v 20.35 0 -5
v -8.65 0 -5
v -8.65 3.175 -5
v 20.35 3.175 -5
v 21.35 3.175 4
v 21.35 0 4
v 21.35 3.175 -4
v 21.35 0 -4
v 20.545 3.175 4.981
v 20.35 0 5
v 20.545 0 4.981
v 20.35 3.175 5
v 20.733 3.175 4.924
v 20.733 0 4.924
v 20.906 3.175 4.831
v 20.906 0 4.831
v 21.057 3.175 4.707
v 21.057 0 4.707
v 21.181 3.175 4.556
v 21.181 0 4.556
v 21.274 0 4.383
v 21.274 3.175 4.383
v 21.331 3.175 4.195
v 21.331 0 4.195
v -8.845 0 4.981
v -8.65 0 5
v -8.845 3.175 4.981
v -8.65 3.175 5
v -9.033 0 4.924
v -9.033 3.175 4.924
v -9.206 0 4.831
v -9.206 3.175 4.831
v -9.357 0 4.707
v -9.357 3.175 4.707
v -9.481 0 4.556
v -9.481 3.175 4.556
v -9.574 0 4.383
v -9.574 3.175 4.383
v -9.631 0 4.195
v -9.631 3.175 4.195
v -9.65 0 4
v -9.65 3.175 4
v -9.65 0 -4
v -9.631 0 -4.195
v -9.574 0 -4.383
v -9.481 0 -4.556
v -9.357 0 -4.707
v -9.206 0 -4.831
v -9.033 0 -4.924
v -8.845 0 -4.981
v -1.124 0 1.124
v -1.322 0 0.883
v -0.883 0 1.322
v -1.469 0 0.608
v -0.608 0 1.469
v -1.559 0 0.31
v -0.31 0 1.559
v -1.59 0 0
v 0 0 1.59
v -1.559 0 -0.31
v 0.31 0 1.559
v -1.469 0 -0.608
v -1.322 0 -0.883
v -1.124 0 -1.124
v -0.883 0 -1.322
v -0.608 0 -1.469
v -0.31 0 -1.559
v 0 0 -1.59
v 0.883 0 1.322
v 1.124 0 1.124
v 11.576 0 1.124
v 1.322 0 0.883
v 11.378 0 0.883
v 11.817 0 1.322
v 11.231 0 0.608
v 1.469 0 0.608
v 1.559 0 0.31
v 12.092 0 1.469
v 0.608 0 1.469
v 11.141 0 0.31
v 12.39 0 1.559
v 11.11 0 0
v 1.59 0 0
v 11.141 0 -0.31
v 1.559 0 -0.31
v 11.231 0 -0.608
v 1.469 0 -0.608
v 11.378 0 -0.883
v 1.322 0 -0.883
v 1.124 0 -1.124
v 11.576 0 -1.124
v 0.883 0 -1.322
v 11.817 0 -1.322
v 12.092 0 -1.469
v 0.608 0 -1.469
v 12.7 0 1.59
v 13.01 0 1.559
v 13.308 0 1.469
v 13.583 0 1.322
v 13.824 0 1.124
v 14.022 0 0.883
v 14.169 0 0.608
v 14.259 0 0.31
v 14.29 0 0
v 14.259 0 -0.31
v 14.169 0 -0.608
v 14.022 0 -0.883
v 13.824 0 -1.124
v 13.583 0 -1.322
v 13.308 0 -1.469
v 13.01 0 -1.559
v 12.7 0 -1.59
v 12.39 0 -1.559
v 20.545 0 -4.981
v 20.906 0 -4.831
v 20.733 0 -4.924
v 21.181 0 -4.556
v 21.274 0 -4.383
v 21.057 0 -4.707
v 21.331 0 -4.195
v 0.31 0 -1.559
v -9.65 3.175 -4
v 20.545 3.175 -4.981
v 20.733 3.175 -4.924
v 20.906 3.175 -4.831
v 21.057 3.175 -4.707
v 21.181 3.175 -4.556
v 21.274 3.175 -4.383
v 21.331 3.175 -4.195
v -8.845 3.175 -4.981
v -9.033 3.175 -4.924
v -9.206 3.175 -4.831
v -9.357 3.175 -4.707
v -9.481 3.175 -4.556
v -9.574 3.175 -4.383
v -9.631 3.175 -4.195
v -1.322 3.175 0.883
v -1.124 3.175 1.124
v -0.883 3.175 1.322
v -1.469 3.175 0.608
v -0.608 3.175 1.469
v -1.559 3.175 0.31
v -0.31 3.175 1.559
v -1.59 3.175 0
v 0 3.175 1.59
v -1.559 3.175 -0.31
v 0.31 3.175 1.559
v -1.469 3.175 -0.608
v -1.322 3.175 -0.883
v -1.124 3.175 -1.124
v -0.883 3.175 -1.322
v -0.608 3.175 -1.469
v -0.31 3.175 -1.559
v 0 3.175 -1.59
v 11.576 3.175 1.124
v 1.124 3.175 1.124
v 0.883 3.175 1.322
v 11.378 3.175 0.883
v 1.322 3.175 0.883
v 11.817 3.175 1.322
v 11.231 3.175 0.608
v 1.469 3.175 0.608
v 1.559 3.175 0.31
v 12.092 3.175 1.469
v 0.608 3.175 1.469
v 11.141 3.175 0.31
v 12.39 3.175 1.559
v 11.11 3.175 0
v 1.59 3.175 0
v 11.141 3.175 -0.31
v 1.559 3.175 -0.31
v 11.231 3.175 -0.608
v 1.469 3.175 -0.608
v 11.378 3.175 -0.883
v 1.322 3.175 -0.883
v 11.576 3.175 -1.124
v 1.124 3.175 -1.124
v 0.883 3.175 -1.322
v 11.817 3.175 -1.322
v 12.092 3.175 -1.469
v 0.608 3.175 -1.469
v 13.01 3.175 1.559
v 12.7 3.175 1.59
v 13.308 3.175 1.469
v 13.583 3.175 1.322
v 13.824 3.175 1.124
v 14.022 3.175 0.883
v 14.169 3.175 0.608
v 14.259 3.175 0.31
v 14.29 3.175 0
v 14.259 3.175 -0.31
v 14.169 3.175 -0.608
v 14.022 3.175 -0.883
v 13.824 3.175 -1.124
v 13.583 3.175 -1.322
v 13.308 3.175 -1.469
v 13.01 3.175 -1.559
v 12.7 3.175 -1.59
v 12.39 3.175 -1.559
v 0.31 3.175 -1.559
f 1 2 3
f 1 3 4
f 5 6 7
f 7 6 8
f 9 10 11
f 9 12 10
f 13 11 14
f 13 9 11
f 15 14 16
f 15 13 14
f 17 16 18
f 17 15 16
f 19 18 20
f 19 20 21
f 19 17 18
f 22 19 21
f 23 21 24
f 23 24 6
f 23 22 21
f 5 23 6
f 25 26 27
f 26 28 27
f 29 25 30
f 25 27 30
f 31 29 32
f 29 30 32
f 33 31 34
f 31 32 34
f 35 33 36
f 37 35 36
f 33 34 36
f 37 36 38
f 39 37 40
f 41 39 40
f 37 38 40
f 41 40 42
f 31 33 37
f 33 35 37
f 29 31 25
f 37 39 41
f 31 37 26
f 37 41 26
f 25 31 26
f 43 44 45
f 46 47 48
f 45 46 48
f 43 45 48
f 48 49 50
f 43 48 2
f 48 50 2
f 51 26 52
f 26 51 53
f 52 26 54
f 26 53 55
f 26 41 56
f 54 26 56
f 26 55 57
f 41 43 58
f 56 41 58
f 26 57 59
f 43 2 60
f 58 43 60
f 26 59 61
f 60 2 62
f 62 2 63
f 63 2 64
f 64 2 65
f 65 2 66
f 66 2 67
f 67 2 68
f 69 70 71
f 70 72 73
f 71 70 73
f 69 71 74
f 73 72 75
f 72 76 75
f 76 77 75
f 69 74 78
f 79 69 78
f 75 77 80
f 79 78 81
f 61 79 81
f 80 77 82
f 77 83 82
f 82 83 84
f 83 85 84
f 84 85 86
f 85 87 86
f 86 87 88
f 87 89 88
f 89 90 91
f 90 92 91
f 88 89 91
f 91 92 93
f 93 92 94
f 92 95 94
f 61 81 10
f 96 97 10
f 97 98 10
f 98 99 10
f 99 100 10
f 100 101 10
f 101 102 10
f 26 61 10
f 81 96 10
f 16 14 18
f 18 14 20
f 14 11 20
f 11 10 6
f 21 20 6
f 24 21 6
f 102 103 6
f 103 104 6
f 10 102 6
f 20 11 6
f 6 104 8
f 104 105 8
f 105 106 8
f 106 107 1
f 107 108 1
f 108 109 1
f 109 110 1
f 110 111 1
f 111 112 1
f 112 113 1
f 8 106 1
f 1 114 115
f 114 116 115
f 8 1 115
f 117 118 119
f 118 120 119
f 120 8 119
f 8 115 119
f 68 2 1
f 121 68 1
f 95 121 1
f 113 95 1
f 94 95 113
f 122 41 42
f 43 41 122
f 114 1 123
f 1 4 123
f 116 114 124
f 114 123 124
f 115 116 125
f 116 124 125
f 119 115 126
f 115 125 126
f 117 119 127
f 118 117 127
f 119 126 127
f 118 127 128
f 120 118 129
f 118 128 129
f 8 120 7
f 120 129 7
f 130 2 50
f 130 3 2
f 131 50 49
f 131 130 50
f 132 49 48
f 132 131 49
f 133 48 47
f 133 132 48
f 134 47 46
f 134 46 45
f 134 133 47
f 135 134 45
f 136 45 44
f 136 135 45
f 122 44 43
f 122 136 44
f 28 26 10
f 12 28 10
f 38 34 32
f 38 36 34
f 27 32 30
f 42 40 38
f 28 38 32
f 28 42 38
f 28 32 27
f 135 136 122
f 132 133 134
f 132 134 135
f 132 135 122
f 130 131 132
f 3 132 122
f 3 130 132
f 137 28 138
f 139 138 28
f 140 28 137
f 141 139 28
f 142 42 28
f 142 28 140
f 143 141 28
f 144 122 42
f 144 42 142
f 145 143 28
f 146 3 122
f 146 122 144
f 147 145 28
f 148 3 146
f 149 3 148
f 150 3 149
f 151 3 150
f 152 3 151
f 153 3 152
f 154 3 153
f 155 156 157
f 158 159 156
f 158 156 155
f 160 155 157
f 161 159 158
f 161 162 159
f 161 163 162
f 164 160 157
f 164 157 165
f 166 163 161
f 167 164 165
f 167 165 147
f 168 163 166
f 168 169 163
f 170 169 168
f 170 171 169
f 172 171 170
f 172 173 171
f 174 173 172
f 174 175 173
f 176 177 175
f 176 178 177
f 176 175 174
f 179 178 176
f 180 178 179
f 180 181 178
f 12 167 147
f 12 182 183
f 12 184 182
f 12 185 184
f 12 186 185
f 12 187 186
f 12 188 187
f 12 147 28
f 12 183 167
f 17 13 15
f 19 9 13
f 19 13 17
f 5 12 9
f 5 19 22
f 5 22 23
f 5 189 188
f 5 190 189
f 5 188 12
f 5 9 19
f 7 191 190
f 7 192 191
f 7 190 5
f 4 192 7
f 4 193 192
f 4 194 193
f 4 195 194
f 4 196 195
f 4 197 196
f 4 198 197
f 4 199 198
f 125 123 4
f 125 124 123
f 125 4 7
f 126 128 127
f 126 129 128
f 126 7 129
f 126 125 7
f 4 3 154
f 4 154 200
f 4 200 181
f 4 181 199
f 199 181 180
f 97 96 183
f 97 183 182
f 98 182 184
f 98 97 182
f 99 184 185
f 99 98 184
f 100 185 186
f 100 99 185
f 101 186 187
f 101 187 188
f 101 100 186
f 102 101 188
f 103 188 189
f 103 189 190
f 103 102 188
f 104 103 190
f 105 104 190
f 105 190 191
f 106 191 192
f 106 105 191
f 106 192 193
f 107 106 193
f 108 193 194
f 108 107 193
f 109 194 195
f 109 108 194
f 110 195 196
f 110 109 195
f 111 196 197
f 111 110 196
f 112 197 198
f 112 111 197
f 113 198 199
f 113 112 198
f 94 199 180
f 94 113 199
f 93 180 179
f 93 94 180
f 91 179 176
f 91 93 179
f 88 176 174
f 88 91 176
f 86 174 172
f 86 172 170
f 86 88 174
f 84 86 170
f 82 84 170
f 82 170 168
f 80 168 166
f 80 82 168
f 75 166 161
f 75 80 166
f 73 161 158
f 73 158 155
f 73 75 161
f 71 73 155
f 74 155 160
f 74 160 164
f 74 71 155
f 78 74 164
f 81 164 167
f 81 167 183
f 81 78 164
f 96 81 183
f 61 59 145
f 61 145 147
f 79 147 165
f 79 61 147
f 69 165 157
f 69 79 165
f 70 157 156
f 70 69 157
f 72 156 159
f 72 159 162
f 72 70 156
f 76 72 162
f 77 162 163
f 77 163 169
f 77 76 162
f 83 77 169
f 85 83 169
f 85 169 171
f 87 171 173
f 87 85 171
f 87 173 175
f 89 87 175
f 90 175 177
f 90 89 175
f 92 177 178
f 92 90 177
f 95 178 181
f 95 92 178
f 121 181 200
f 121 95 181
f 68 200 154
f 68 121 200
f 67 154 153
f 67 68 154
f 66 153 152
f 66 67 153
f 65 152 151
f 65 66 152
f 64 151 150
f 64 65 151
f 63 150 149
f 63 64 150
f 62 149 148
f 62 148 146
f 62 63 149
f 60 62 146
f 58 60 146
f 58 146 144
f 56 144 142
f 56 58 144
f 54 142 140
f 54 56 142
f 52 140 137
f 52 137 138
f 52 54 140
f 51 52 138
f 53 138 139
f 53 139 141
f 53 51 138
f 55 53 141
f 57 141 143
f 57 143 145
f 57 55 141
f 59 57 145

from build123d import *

# Parameters (mm, degrees)
SKETCH1_W           = 20
SKETCH1_H           = 10
SKETCH1_R           = 1.59
SKETCH1_W_2         = 6
SKETCH1_W_3         = 5
BOSS_EXTRUDE1_DEPTH = 3.175
FILLET1_R           = 1


with BuildPart() as part:
    # Sketch1 → Boss-Extrude1 (new body)
    # profile 1 of 3: a face of its own
    with BuildSketch(Plane(origin=(0, 0, 0), x_dir=(1, 0, 0), z_dir=(0, 1, 0))):
        with Locations((6.35, 0)):
            Rectangle(SKETCH1_W, SKETCH1_H)
        with Locations(Location((0, 0, 0), (0, 0, 270))):
            Circle(SKETCH1_R, mode=Mode.SUBTRACT)
        with Locations(Location((12.7, 0, 0), (0, 0, 270))):
            Circle(SKETCH1_R, mode=Mode.SUBTRACT)
    # profile 2 of 3: a face of its own
    with BuildSketch(Plane(origin=(0, 0, 0), x_dir=(1, 0, 0), z_dir=(0, 1, 0))):
        with Locations((-6.65, 0)):
            Rectangle(SKETCH1_W_2, SKETCH1_H)
    # profile 3 of 3: a face of its own
    with BuildSketch(Plane(origin=(0, 0, 0), x_dir=(1, 0, 0), z_dir=(0, 1, 0))):
        with Locations((18.85, 0)):
            Rectangle(SKETCH1_W_3, SKETCH1_H)
    extrude(amount=BOSS_EXTRUDE1_DEPTH)

    # Fillet1
    fillet1_edges = [part.edges().sort_by_distance(p)[0] for p in [
        (-9.65, 1.5875, 5),
        (-9.65, 1.5875, -5),
        (21.35, 1.5875, -5),
        (21.35, 1.5875, 5),
    ]]
    fillet(fillet1_edges, radius=FILLET1_R)


solid = part.part
